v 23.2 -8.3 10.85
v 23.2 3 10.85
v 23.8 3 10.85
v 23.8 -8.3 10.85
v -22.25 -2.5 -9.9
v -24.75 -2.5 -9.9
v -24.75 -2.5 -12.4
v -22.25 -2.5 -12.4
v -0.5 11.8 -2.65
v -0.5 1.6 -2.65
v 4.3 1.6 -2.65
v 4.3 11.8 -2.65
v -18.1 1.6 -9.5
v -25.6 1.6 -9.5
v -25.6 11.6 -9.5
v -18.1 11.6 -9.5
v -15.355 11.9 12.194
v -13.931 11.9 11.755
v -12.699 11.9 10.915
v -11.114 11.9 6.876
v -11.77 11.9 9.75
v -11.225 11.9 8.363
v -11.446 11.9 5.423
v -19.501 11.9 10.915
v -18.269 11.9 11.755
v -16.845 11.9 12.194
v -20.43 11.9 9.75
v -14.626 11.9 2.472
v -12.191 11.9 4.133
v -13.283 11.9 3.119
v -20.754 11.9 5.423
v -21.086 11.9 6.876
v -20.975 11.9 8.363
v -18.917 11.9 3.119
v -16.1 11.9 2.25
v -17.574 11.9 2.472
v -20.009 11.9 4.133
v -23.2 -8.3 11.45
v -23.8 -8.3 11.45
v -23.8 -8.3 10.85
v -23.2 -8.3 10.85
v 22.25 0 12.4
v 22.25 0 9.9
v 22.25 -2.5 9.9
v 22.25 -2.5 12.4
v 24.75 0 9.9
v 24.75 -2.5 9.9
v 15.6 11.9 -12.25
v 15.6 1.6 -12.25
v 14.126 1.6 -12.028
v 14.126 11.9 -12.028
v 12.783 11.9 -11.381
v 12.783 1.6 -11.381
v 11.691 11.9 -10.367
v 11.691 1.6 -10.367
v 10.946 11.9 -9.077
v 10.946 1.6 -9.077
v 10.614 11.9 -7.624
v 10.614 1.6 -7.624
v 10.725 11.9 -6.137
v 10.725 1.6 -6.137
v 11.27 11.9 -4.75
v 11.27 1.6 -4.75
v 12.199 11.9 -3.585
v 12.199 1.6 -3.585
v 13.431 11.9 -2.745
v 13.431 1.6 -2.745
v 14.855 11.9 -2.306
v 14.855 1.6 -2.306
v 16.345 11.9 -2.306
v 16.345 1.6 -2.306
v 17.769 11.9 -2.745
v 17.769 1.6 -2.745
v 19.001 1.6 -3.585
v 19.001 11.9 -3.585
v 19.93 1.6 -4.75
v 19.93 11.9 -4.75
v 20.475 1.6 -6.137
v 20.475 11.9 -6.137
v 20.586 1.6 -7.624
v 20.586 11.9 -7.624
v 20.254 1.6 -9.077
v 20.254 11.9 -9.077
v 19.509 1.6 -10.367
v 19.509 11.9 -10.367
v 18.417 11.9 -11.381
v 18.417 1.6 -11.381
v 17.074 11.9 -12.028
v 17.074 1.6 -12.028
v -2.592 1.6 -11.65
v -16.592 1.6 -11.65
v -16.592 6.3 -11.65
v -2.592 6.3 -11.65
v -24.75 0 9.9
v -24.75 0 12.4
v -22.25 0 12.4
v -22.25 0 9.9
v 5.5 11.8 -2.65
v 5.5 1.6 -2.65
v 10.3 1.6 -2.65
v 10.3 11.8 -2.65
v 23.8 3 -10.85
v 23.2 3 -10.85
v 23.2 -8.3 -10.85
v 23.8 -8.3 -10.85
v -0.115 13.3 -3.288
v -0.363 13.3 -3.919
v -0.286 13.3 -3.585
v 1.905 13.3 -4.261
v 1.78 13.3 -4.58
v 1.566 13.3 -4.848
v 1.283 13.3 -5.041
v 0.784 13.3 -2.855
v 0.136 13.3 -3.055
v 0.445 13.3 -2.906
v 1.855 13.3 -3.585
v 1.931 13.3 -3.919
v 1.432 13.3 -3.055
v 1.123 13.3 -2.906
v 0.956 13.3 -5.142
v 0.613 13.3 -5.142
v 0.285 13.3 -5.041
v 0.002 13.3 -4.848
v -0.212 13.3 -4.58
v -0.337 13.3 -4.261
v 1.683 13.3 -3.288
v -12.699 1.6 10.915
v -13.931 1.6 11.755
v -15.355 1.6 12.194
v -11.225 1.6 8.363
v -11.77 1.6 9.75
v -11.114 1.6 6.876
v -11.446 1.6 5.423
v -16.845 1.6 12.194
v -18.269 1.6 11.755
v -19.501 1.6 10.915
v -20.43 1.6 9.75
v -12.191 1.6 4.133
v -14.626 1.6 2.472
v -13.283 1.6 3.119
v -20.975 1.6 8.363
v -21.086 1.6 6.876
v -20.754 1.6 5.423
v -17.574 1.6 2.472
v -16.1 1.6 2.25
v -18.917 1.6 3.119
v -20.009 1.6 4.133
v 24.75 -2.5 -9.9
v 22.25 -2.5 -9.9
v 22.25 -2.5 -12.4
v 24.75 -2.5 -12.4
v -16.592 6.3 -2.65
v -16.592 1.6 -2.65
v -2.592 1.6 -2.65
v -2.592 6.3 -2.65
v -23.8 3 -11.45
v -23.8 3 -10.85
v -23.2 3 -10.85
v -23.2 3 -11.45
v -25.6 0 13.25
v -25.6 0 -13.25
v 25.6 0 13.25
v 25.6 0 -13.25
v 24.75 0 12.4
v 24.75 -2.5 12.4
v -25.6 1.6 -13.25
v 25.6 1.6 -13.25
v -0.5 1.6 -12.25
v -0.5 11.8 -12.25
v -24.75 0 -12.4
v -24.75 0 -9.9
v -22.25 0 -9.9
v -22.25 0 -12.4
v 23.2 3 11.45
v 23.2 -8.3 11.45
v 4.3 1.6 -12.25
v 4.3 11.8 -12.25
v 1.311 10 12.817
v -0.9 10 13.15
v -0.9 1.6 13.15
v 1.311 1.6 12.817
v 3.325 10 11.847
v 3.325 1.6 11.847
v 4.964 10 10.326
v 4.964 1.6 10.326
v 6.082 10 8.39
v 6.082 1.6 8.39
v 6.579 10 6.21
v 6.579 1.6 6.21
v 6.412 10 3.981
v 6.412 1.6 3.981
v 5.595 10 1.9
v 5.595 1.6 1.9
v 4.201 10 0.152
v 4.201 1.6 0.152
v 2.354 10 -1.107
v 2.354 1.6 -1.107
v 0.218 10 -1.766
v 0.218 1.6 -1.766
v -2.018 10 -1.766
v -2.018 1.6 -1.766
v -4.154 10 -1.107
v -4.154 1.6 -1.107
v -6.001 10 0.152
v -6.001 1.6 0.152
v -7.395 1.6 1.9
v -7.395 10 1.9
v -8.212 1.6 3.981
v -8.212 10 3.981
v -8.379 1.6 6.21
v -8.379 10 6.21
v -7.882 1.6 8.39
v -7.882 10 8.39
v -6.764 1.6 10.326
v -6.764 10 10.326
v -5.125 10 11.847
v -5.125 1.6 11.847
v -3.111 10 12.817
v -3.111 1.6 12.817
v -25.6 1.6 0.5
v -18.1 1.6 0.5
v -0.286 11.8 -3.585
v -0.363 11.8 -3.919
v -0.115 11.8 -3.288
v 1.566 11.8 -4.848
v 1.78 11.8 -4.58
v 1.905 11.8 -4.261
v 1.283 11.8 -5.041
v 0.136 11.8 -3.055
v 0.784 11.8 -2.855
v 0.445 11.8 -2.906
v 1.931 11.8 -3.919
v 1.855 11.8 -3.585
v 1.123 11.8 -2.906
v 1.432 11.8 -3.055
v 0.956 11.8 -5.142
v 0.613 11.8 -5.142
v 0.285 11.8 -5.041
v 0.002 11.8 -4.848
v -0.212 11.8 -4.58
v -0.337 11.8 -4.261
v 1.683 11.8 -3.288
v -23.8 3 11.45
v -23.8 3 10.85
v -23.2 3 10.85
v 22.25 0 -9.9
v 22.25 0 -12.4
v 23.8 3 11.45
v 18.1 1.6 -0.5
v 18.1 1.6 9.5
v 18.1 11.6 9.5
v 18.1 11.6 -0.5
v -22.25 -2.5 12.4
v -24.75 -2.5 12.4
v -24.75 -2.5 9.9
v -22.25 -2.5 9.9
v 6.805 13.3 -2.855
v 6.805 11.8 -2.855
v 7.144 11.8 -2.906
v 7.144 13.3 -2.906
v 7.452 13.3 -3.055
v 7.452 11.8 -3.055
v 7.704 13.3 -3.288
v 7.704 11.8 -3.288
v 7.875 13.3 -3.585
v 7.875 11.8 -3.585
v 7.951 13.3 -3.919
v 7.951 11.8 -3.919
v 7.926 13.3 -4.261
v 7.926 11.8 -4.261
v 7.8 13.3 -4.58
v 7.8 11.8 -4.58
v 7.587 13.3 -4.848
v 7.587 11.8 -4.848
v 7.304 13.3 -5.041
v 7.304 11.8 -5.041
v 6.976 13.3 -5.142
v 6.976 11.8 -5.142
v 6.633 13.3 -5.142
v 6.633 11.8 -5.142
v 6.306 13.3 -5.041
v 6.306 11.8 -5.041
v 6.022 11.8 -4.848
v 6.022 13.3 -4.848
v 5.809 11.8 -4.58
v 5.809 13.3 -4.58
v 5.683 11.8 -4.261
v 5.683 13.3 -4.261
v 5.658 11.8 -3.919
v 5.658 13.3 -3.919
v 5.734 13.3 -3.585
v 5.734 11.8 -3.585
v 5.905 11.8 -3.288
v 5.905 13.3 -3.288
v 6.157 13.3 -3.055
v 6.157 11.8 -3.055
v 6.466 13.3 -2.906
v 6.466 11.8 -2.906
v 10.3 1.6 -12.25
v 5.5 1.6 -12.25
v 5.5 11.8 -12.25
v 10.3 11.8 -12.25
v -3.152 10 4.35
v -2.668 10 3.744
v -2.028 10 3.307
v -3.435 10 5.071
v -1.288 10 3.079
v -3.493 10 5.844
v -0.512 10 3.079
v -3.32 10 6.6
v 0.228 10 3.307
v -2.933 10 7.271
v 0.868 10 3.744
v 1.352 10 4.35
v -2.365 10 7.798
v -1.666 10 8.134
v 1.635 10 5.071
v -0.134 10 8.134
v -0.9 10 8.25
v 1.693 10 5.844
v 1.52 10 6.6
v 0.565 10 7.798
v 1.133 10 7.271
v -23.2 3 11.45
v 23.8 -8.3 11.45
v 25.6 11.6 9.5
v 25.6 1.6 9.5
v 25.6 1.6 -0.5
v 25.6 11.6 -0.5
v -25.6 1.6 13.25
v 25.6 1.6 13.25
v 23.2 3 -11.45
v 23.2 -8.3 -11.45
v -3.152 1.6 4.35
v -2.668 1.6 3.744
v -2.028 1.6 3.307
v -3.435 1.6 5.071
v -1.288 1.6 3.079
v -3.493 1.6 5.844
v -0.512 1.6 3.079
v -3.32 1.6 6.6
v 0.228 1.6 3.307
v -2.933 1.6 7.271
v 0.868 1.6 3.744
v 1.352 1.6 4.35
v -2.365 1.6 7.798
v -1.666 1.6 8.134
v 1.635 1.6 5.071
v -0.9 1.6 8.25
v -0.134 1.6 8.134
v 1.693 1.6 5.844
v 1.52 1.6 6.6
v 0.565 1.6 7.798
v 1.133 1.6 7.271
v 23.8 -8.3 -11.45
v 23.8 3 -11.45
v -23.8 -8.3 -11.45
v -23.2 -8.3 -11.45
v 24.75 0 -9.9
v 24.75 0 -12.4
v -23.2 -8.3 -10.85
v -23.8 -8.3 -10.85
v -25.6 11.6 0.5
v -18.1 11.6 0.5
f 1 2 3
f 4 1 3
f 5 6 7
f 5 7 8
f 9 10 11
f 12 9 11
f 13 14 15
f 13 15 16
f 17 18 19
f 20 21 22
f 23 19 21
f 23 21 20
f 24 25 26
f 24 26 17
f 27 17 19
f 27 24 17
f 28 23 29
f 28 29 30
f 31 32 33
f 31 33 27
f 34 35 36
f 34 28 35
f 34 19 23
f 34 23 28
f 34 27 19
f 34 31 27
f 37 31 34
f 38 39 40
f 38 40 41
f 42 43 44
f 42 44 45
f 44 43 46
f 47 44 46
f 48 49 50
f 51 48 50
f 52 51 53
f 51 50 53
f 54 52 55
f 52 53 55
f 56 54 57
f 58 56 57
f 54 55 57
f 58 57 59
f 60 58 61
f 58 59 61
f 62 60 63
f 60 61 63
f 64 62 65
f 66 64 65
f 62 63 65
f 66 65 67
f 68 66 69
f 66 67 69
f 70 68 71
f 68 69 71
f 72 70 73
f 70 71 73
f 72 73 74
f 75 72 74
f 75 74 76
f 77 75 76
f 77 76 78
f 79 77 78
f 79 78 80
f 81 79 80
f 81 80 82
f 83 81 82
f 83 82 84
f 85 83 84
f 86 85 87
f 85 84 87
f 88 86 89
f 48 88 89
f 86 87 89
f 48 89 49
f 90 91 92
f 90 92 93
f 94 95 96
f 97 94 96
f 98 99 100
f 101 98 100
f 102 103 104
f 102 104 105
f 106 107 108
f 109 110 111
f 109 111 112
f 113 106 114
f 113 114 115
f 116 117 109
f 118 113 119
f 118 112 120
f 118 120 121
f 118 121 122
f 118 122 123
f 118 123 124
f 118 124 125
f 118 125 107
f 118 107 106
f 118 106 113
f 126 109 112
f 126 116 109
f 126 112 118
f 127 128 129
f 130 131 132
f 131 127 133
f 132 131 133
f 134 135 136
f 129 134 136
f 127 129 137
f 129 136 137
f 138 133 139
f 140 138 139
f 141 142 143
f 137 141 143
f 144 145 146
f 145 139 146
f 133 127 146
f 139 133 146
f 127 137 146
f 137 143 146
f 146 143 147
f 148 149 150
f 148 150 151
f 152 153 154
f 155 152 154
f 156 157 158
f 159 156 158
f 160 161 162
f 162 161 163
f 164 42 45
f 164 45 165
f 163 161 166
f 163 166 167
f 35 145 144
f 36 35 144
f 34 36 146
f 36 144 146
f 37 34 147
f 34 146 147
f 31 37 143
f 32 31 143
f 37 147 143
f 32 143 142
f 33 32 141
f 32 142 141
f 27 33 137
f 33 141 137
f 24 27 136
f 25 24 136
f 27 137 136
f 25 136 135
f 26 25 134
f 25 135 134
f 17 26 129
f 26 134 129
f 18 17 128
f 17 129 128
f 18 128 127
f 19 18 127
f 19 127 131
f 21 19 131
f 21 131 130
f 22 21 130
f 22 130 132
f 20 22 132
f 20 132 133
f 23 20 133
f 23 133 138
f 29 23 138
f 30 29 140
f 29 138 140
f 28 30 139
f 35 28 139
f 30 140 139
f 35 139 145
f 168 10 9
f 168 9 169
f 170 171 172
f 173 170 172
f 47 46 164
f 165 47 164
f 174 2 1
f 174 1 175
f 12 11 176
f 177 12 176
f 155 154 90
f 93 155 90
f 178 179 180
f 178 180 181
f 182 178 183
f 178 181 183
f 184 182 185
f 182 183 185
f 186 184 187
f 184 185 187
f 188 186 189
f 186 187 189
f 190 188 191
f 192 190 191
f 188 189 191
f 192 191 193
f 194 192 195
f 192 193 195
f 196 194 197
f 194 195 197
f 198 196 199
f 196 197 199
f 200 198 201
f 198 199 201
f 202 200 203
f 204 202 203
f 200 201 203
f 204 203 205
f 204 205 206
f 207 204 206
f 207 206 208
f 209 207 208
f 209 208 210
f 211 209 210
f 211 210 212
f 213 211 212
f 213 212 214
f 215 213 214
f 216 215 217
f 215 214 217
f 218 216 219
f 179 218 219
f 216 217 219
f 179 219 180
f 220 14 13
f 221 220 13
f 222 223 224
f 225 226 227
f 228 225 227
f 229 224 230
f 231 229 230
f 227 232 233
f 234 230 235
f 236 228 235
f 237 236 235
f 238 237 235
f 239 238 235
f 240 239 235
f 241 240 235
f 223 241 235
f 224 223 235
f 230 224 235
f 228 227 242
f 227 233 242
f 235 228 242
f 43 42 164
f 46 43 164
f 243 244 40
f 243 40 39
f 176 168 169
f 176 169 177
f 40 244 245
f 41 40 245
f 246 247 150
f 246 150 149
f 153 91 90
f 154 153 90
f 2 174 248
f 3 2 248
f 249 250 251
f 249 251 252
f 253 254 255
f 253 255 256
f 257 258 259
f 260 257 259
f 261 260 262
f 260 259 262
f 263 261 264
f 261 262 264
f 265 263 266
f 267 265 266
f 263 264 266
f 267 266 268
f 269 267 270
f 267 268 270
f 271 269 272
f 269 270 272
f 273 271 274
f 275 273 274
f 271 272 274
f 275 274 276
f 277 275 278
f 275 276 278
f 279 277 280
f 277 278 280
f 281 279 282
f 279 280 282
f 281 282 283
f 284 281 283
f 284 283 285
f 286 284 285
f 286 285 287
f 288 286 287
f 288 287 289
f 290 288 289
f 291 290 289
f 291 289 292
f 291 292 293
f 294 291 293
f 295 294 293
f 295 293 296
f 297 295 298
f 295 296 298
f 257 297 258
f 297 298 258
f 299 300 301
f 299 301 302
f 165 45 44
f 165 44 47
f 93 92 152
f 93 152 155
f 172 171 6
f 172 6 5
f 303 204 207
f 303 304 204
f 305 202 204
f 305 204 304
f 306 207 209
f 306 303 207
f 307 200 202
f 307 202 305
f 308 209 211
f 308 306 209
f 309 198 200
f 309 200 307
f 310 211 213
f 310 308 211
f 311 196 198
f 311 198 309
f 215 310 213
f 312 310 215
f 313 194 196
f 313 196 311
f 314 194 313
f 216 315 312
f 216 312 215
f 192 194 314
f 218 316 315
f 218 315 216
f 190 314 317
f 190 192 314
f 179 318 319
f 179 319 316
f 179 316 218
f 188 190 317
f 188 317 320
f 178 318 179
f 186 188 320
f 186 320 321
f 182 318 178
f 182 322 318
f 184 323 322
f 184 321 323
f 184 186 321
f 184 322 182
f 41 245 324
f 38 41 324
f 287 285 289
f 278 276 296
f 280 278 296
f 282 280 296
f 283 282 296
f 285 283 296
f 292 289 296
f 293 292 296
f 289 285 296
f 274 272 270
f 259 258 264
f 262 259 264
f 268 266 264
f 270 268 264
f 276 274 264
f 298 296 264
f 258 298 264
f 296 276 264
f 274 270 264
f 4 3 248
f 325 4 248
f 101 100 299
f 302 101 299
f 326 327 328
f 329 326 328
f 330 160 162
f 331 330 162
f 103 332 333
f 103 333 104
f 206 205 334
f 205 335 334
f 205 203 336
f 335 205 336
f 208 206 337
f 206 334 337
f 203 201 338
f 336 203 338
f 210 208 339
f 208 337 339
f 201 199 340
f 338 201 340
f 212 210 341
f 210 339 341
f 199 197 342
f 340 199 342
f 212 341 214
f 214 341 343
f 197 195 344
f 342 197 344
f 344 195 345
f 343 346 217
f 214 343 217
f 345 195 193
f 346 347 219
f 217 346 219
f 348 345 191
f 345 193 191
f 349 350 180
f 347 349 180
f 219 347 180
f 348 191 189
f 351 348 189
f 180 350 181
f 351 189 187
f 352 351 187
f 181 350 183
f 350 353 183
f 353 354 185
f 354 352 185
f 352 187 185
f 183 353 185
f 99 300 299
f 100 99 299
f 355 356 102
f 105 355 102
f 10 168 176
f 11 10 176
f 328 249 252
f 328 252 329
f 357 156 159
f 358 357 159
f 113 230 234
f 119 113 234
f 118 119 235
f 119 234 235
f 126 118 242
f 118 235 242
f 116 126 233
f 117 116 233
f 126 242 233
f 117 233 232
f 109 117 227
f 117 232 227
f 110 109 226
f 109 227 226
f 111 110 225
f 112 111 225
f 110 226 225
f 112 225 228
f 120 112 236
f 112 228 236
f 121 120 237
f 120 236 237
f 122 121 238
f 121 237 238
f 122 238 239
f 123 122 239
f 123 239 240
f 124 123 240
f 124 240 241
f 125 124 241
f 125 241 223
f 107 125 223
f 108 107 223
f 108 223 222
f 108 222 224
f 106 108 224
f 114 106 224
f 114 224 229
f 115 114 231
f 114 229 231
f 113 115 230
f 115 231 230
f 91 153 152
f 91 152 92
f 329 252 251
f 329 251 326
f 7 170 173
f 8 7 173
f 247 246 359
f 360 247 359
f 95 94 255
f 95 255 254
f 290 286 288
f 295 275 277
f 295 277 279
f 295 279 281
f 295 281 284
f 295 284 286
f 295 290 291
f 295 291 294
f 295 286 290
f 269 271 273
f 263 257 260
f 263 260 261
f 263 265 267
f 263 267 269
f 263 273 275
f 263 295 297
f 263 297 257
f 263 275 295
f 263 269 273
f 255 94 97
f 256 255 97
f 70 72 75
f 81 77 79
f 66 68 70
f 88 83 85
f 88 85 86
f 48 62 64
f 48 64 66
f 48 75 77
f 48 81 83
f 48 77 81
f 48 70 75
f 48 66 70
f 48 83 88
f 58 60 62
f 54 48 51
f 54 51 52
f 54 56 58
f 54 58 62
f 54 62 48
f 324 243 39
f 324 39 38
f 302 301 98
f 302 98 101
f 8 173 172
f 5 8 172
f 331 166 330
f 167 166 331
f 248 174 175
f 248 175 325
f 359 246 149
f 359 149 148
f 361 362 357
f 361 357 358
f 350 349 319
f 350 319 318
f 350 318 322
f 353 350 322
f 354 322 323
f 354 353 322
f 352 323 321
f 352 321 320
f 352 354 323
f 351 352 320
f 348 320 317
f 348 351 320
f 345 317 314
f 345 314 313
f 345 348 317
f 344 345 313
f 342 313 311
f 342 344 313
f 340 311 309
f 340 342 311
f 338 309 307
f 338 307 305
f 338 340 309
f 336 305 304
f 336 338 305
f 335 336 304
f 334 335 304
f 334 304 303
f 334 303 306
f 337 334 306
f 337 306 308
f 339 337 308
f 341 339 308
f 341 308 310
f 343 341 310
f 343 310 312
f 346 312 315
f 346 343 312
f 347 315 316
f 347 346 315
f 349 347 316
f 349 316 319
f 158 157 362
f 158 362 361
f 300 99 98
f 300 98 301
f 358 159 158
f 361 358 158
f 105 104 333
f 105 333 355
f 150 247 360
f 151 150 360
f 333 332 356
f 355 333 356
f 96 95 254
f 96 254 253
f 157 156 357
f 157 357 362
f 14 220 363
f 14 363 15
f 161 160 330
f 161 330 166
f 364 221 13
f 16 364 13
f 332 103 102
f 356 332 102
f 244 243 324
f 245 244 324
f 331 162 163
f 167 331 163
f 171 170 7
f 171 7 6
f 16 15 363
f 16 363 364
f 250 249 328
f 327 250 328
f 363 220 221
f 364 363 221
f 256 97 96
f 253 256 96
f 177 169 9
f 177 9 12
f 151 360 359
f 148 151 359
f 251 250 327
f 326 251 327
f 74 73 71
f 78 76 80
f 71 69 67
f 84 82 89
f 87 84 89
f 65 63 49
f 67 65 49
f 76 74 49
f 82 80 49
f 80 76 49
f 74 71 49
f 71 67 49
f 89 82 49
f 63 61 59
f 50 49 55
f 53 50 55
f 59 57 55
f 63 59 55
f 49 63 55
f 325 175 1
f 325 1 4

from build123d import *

# Parameters (mm, degrees)
ESQUISSE1_W               = 51.2
ESQUISSE1_H               = 26.5
BOSS_EXTRU_1_DEPTH        = 1.6
ESQUISSE2_W               = 7.5
ESQUISSE2_H               = 10
BOSS_EXTRU_2_DEPTH        = 10
BOSS_EXTRU_2_2_DEPTH      = 10
ESQUISSE3_R               = 5
BOSS_EXTRU_3_DEPTH        = 10.3
BOSS_EXTRU_3_2_DEPTH      = 10.3
ESQUISSE4_W               = 4.8
ESQUISSE4_H               = 9.6
BOSS_EXTRU_4_DEPTH        = 10.2
BOSS_EXTRU_4_2_DEPTH      = 10.2
ESQUISSE5_R               = 1.15
BOSS_EXTRU_5_DEPTH        = 1.5
BOSS_EXTRU_5_2_DEPTH      = 1.5
ESQUISSE6_R               = 7.5
ESQUISSE6_R_2             = 2.6
BOSS_EXTRU_6_DEPTH        = 8.4
ESQUISSE7_W               = 14
ESQUISSE7_H               = 9
BOSS_EXTRU_7_DEPTH        = 4.7
BOSS_EXTRU_8_DEPTH        = 8.3
BOSS_EXTRU_8_DEPTH_BACK   = 3
ESQUISSE8_W               = 0.6
ESQUISSE8_H               = 0.6
BOSS_EXTRU_8_2_DEPTH      = 8.3
BOSS_EXTRU_8_2_DEPTH_BACK = 3
BOSS_EXTRU_8_3_DEPTH      = 8.3
BOSS_EXTRU_8_3_DEPTH_BACK = 3
BOSS_EXTRU_8_4_DEPTH      = 8.3
BOSS_EXTRU_8_4_DEPTH_BACK = 3
ESQUISSE9_W               = 2.5
ESQUISSE9_H               = 2.5
BOSS_EXTRU_9_DEPTH        = 2.5
BOSS_EXTRU_9_2_DEPTH      = 2.5
BOSS_EXTRU_9_3_DEPTH      = 2.5
BOSS_EXTRU_9_4_DEPTH      = 2.5


with BuildPart() as part:
    # Esquisse1 → Boss.-Extru.1 (new body)
    with BuildSketch(Plane(origin=(0, 0, 0), x_dir=(1, 0, 0), z_dir=(0, 1, 0))):
        Rectangle(ESQUISSE1_W, ESQUISSE1_H)
    extrude(amount=BOSS_EXTRU_1_DEPTH)


with BuildPart() as body_2:
    # Esquisse2 → Boss.-Extru.2 (new body)
    with BuildSketch(Plane(origin=(0, 1.6, 0), x_dir=(1, 0, 0), z_dir=(0, 1, 0))):
        with Locations((-21.85, 4.5)):
            Rectangle(ESQUISSE2_W, ESQUISSE2_H)
    extrude(amount=BOSS_EXTRU_2_DEPTH)


with BuildPart() as body_3:
    # Esquisse2 → Boss.-Extru.2 2 (new body)
    with BuildSketch(Plane(origin=(0, 1.6, 0), x_dir=(1, 0, 0), z_dir=(0, 1, 0))):
        with Locations((21.85, -4.5)):
            Rectangle(ESQUISSE2_W, ESQUISSE2_H)
    extrude(amount=BOSS_EXTRU_2_2_DEPTH)


with BuildPart() as body_4:
    # Esquisse3 → Boss.-Extru.3 (new body)
    with BuildSketch(Plane(origin=(0, 1.6, 0), x_dir=(1, 0, 0), z_dir=(0, 1, 0))):
        with Locations(Location((15.6, 7.25, 0), (0, 0, 90))):
            Circle(ESQUISSE3_R)
    extrude(amount=BOSS_EXTRU_3_DEPTH)


with BuildPart() as body_5:
    # Esquisse3 → Boss.-Extru.3 2 (new body)
    with BuildSketch(Plane(origin=(0, 1.6, 0), x_dir=(1, 0, 0), z_dir=(0, 1, 0))):
        with Locations(Location((-16.1, -7.25, 0), (0, 0, 90))):
            Circle(ESQUISSE3_R)
    extrude(amount=BOSS_EXTRU_3_2_DEPTH)


with BuildPart() as body_6:
    # Esquisse4 → Boss.-Extru.4 (new body)
    with BuildSketch(Plane(origin=(0, 1.6, 0), x_dir=(1, 0, 0), z_dir=(0, 1, 0))):
        with Locations((1.9, 7.45)):
            Rectangle(ESQUISSE4_W, ESQUISSE4_H)
    extrude(amount=BOSS_EXTRU_4_DEPTH)


with BuildPart() as body_7:
    # Esquisse4 → Boss.-Extru.4 2 (new body)
    with BuildSketch(Plane(origin=(0, 1.6, 0), x_dir=(1, 0, 0), z_dir=(0, 1, 0))):
        with Locations((7.9, 7.45)):
            Rectangle(ESQUISSE4_W, ESQUISSE4_H)
    extrude(amount=BOSS_EXTRU_4_2_DEPTH)


with BuildPart() as body_8:
    # Esquisse5 → Boss.-Extru.5 (new body)
    with BuildSketch(Plane(origin=(0, 11.8, 0), x_dir=(1, 0, 0), z_dir=(0, 1, 0))):
        with Locations(Location((0.784252414, 4.00485602, 0), (0, 0, 270))):
            Circle(ESQUISSE5_R)
    extrude(amount=BOSS_EXTRU_5_DEPTH)


with BuildPart() as body_9:
    # Esquisse5 → Boss.-Extru.5 2 (new body)
    with BuildSketch(Plane(origin=(0, 11.8, 0), x_dir=(1, 0, 0), z_dir=(0, 1, 0))):
        with Locations(Location((6.804540863, 4.00485602, 0), (0, 0, 270))):
            Circle(ESQUISSE5_R)
    extrude(amount=BOSS_EXTRU_5_2_DEPTH)


with BuildPart() as body_10:
    # Esquisse6 → Boss.-Extru.6 (new body)
    with BuildSketch(Plane(origin=(0, 1.6, 0), x_dir=(1, 0, 0), z_dir=(0, 1, 0))):
        with Locations(Location((-0.9, -5.65, 0), (0, 0, 270))):
            Circle(ESQUISSE6_R)
        with Locations(Location((-0.9, -5.65, 0), (0, 0, 270))):
            Circle(ESQUISSE6_R_2, mode=Mode.SUBTRACT)
    extrude(amount=BOSS_EXTRU_6_DEPTH)


with BuildPart() as body_11:
    # Esquisse7 → Boss.-Extru.7 (new body)
    with BuildSketch(Plane(origin=(0, 1.6, 0), x_dir=(1, 0, 0), z_dir=(0, 1, 0))):
        with Locations((-9.592278393, 7.15)):
            Rectangle(ESQUISSE7_W, ESQUISSE7_H)
    extrude(amount=BOSS_EXTRU_7_DEPTH)


with BuildPart() as body_12:
    # Esquisse8 → Boss.-Extru.8 (new, two sides: drawn at the far end of the back side and taken through both)
    with BuildSketch(Plane.XZ.offset(-BOSS_EXTRU_8_DEPTH_BACK)):
        with Locations((-23.5, 11.15)):
            Rectangle(ESQUISSE8_W, ESQUISSE8_H)
    extrude(amount=BOSS_EXTRU_8_DEPTH + BOSS_EXTRU_8_DEPTH_BACK)


with BuildPart() as body_13:
    # Esquisse8 → Boss.-Extru.8 2 (new, two sides: drawn at the far end of the back side and taken through both)
    with BuildSketch(Plane.XZ.offset(-BOSS_EXTRU_8_2_DEPTH_BACK)):
        with Locations((23.5, 11.15)):
            Rectangle(ESQUISSE8_W, ESQUISSE8_H)
    extrude(amount=BOSS_EXTRU_8_2_DEPTH + BOSS_EXTRU_8_2_DEPTH_BACK)


with BuildPart() as body_14:
    # Esquisse8 → Boss.-Extru.8 3 (new, two sides: drawn at the far end of the back side and taken through both)
    with BuildSketch(Plane.XZ.offset(-BOSS_EXTRU_8_3_DEPTH_BACK)):
        with Locations((23.5, -11.15)):
            Rectangle(ESQUISSE8_W, ESQUISSE8_H)
    extrude(amount=BOSS_EXTRU_8_3_DEPTH + BOSS_EXTRU_8_3_DEPTH_BACK)


with BuildPart() as body_15:
    # Esquisse8 → Boss.-Extru.8 4 (new, two sides: drawn at the far end of the back side and taken through both)
    with BuildSketch(Plane.XZ.offset(-BOSS_EXTRU_8_4_DEPTH_BACK)):
        with Locations((-23.5, -11.15)):
            Rectangle(ESQUISSE8_W, ESQUISSE8_H)
    extrude(amount=BOSS_EXTRU_8_4_DEPTH + BOSS_EXTRU_8_4_DEPTH_BACK)


with BuildPart() as body_16:
    # Esquisse9 → Boss.-Extru.9 (new body)
    with BuildSketch(Plane.XZ):
        with Locations((-23.5, 11.15)):
            Rectangle(ESQUISSE9_W, ESQUISSE9_H)
    extrude(amount=BOSS_EXTRU_9_DEPTH)


with BuildPart() as body_17:
    # Esquisse9 → Boss.-Extru.9 2 (new body)
    with BuildSketch(Plane.XZ):
        with Locations((23.5, 11.15)):
            Rectangle(ESQUISSE9_W, ESQUISSE9_H)
    extrude(amount=BOSS_EXTRU_9_2_DEPTH)


with BuildPart() as body_18:
    # Esquisse9 → Boss.-Extru.9 3 (new body)
    with BuildSketch(Plane.XZ):
        with Locations((23.5, -11.15)):
            Rectangle(ESQUISSE9_W, ESQUISSE9_H)
    extrude(amount=BOSS_EXTRU_9_3_DEPTH)


with BuildPart() as body_19:
    # Esquisse9 → Boss.-Extru.9 4 (new body)
    with BuildSketch(Plane.XZ):
        with Locations((-23.5, -11.15)):
            Rectangle(ESQUISSE9_W, ESQUISSE9_H)
    extrude(amount=BOSS_EXTRU_9_4_DEPTH)


solid = Compound([part.part, body_2.part, body_3.part, body_4.part, body_5.part, body_6.part, body_7.part, body_8.part, body_9.part, body_10.part, body_11.part, body_12.part, body_13.part, body_14.part, body_15.part, body_16.part, body_17.part, body_18.part, body_19.part])
